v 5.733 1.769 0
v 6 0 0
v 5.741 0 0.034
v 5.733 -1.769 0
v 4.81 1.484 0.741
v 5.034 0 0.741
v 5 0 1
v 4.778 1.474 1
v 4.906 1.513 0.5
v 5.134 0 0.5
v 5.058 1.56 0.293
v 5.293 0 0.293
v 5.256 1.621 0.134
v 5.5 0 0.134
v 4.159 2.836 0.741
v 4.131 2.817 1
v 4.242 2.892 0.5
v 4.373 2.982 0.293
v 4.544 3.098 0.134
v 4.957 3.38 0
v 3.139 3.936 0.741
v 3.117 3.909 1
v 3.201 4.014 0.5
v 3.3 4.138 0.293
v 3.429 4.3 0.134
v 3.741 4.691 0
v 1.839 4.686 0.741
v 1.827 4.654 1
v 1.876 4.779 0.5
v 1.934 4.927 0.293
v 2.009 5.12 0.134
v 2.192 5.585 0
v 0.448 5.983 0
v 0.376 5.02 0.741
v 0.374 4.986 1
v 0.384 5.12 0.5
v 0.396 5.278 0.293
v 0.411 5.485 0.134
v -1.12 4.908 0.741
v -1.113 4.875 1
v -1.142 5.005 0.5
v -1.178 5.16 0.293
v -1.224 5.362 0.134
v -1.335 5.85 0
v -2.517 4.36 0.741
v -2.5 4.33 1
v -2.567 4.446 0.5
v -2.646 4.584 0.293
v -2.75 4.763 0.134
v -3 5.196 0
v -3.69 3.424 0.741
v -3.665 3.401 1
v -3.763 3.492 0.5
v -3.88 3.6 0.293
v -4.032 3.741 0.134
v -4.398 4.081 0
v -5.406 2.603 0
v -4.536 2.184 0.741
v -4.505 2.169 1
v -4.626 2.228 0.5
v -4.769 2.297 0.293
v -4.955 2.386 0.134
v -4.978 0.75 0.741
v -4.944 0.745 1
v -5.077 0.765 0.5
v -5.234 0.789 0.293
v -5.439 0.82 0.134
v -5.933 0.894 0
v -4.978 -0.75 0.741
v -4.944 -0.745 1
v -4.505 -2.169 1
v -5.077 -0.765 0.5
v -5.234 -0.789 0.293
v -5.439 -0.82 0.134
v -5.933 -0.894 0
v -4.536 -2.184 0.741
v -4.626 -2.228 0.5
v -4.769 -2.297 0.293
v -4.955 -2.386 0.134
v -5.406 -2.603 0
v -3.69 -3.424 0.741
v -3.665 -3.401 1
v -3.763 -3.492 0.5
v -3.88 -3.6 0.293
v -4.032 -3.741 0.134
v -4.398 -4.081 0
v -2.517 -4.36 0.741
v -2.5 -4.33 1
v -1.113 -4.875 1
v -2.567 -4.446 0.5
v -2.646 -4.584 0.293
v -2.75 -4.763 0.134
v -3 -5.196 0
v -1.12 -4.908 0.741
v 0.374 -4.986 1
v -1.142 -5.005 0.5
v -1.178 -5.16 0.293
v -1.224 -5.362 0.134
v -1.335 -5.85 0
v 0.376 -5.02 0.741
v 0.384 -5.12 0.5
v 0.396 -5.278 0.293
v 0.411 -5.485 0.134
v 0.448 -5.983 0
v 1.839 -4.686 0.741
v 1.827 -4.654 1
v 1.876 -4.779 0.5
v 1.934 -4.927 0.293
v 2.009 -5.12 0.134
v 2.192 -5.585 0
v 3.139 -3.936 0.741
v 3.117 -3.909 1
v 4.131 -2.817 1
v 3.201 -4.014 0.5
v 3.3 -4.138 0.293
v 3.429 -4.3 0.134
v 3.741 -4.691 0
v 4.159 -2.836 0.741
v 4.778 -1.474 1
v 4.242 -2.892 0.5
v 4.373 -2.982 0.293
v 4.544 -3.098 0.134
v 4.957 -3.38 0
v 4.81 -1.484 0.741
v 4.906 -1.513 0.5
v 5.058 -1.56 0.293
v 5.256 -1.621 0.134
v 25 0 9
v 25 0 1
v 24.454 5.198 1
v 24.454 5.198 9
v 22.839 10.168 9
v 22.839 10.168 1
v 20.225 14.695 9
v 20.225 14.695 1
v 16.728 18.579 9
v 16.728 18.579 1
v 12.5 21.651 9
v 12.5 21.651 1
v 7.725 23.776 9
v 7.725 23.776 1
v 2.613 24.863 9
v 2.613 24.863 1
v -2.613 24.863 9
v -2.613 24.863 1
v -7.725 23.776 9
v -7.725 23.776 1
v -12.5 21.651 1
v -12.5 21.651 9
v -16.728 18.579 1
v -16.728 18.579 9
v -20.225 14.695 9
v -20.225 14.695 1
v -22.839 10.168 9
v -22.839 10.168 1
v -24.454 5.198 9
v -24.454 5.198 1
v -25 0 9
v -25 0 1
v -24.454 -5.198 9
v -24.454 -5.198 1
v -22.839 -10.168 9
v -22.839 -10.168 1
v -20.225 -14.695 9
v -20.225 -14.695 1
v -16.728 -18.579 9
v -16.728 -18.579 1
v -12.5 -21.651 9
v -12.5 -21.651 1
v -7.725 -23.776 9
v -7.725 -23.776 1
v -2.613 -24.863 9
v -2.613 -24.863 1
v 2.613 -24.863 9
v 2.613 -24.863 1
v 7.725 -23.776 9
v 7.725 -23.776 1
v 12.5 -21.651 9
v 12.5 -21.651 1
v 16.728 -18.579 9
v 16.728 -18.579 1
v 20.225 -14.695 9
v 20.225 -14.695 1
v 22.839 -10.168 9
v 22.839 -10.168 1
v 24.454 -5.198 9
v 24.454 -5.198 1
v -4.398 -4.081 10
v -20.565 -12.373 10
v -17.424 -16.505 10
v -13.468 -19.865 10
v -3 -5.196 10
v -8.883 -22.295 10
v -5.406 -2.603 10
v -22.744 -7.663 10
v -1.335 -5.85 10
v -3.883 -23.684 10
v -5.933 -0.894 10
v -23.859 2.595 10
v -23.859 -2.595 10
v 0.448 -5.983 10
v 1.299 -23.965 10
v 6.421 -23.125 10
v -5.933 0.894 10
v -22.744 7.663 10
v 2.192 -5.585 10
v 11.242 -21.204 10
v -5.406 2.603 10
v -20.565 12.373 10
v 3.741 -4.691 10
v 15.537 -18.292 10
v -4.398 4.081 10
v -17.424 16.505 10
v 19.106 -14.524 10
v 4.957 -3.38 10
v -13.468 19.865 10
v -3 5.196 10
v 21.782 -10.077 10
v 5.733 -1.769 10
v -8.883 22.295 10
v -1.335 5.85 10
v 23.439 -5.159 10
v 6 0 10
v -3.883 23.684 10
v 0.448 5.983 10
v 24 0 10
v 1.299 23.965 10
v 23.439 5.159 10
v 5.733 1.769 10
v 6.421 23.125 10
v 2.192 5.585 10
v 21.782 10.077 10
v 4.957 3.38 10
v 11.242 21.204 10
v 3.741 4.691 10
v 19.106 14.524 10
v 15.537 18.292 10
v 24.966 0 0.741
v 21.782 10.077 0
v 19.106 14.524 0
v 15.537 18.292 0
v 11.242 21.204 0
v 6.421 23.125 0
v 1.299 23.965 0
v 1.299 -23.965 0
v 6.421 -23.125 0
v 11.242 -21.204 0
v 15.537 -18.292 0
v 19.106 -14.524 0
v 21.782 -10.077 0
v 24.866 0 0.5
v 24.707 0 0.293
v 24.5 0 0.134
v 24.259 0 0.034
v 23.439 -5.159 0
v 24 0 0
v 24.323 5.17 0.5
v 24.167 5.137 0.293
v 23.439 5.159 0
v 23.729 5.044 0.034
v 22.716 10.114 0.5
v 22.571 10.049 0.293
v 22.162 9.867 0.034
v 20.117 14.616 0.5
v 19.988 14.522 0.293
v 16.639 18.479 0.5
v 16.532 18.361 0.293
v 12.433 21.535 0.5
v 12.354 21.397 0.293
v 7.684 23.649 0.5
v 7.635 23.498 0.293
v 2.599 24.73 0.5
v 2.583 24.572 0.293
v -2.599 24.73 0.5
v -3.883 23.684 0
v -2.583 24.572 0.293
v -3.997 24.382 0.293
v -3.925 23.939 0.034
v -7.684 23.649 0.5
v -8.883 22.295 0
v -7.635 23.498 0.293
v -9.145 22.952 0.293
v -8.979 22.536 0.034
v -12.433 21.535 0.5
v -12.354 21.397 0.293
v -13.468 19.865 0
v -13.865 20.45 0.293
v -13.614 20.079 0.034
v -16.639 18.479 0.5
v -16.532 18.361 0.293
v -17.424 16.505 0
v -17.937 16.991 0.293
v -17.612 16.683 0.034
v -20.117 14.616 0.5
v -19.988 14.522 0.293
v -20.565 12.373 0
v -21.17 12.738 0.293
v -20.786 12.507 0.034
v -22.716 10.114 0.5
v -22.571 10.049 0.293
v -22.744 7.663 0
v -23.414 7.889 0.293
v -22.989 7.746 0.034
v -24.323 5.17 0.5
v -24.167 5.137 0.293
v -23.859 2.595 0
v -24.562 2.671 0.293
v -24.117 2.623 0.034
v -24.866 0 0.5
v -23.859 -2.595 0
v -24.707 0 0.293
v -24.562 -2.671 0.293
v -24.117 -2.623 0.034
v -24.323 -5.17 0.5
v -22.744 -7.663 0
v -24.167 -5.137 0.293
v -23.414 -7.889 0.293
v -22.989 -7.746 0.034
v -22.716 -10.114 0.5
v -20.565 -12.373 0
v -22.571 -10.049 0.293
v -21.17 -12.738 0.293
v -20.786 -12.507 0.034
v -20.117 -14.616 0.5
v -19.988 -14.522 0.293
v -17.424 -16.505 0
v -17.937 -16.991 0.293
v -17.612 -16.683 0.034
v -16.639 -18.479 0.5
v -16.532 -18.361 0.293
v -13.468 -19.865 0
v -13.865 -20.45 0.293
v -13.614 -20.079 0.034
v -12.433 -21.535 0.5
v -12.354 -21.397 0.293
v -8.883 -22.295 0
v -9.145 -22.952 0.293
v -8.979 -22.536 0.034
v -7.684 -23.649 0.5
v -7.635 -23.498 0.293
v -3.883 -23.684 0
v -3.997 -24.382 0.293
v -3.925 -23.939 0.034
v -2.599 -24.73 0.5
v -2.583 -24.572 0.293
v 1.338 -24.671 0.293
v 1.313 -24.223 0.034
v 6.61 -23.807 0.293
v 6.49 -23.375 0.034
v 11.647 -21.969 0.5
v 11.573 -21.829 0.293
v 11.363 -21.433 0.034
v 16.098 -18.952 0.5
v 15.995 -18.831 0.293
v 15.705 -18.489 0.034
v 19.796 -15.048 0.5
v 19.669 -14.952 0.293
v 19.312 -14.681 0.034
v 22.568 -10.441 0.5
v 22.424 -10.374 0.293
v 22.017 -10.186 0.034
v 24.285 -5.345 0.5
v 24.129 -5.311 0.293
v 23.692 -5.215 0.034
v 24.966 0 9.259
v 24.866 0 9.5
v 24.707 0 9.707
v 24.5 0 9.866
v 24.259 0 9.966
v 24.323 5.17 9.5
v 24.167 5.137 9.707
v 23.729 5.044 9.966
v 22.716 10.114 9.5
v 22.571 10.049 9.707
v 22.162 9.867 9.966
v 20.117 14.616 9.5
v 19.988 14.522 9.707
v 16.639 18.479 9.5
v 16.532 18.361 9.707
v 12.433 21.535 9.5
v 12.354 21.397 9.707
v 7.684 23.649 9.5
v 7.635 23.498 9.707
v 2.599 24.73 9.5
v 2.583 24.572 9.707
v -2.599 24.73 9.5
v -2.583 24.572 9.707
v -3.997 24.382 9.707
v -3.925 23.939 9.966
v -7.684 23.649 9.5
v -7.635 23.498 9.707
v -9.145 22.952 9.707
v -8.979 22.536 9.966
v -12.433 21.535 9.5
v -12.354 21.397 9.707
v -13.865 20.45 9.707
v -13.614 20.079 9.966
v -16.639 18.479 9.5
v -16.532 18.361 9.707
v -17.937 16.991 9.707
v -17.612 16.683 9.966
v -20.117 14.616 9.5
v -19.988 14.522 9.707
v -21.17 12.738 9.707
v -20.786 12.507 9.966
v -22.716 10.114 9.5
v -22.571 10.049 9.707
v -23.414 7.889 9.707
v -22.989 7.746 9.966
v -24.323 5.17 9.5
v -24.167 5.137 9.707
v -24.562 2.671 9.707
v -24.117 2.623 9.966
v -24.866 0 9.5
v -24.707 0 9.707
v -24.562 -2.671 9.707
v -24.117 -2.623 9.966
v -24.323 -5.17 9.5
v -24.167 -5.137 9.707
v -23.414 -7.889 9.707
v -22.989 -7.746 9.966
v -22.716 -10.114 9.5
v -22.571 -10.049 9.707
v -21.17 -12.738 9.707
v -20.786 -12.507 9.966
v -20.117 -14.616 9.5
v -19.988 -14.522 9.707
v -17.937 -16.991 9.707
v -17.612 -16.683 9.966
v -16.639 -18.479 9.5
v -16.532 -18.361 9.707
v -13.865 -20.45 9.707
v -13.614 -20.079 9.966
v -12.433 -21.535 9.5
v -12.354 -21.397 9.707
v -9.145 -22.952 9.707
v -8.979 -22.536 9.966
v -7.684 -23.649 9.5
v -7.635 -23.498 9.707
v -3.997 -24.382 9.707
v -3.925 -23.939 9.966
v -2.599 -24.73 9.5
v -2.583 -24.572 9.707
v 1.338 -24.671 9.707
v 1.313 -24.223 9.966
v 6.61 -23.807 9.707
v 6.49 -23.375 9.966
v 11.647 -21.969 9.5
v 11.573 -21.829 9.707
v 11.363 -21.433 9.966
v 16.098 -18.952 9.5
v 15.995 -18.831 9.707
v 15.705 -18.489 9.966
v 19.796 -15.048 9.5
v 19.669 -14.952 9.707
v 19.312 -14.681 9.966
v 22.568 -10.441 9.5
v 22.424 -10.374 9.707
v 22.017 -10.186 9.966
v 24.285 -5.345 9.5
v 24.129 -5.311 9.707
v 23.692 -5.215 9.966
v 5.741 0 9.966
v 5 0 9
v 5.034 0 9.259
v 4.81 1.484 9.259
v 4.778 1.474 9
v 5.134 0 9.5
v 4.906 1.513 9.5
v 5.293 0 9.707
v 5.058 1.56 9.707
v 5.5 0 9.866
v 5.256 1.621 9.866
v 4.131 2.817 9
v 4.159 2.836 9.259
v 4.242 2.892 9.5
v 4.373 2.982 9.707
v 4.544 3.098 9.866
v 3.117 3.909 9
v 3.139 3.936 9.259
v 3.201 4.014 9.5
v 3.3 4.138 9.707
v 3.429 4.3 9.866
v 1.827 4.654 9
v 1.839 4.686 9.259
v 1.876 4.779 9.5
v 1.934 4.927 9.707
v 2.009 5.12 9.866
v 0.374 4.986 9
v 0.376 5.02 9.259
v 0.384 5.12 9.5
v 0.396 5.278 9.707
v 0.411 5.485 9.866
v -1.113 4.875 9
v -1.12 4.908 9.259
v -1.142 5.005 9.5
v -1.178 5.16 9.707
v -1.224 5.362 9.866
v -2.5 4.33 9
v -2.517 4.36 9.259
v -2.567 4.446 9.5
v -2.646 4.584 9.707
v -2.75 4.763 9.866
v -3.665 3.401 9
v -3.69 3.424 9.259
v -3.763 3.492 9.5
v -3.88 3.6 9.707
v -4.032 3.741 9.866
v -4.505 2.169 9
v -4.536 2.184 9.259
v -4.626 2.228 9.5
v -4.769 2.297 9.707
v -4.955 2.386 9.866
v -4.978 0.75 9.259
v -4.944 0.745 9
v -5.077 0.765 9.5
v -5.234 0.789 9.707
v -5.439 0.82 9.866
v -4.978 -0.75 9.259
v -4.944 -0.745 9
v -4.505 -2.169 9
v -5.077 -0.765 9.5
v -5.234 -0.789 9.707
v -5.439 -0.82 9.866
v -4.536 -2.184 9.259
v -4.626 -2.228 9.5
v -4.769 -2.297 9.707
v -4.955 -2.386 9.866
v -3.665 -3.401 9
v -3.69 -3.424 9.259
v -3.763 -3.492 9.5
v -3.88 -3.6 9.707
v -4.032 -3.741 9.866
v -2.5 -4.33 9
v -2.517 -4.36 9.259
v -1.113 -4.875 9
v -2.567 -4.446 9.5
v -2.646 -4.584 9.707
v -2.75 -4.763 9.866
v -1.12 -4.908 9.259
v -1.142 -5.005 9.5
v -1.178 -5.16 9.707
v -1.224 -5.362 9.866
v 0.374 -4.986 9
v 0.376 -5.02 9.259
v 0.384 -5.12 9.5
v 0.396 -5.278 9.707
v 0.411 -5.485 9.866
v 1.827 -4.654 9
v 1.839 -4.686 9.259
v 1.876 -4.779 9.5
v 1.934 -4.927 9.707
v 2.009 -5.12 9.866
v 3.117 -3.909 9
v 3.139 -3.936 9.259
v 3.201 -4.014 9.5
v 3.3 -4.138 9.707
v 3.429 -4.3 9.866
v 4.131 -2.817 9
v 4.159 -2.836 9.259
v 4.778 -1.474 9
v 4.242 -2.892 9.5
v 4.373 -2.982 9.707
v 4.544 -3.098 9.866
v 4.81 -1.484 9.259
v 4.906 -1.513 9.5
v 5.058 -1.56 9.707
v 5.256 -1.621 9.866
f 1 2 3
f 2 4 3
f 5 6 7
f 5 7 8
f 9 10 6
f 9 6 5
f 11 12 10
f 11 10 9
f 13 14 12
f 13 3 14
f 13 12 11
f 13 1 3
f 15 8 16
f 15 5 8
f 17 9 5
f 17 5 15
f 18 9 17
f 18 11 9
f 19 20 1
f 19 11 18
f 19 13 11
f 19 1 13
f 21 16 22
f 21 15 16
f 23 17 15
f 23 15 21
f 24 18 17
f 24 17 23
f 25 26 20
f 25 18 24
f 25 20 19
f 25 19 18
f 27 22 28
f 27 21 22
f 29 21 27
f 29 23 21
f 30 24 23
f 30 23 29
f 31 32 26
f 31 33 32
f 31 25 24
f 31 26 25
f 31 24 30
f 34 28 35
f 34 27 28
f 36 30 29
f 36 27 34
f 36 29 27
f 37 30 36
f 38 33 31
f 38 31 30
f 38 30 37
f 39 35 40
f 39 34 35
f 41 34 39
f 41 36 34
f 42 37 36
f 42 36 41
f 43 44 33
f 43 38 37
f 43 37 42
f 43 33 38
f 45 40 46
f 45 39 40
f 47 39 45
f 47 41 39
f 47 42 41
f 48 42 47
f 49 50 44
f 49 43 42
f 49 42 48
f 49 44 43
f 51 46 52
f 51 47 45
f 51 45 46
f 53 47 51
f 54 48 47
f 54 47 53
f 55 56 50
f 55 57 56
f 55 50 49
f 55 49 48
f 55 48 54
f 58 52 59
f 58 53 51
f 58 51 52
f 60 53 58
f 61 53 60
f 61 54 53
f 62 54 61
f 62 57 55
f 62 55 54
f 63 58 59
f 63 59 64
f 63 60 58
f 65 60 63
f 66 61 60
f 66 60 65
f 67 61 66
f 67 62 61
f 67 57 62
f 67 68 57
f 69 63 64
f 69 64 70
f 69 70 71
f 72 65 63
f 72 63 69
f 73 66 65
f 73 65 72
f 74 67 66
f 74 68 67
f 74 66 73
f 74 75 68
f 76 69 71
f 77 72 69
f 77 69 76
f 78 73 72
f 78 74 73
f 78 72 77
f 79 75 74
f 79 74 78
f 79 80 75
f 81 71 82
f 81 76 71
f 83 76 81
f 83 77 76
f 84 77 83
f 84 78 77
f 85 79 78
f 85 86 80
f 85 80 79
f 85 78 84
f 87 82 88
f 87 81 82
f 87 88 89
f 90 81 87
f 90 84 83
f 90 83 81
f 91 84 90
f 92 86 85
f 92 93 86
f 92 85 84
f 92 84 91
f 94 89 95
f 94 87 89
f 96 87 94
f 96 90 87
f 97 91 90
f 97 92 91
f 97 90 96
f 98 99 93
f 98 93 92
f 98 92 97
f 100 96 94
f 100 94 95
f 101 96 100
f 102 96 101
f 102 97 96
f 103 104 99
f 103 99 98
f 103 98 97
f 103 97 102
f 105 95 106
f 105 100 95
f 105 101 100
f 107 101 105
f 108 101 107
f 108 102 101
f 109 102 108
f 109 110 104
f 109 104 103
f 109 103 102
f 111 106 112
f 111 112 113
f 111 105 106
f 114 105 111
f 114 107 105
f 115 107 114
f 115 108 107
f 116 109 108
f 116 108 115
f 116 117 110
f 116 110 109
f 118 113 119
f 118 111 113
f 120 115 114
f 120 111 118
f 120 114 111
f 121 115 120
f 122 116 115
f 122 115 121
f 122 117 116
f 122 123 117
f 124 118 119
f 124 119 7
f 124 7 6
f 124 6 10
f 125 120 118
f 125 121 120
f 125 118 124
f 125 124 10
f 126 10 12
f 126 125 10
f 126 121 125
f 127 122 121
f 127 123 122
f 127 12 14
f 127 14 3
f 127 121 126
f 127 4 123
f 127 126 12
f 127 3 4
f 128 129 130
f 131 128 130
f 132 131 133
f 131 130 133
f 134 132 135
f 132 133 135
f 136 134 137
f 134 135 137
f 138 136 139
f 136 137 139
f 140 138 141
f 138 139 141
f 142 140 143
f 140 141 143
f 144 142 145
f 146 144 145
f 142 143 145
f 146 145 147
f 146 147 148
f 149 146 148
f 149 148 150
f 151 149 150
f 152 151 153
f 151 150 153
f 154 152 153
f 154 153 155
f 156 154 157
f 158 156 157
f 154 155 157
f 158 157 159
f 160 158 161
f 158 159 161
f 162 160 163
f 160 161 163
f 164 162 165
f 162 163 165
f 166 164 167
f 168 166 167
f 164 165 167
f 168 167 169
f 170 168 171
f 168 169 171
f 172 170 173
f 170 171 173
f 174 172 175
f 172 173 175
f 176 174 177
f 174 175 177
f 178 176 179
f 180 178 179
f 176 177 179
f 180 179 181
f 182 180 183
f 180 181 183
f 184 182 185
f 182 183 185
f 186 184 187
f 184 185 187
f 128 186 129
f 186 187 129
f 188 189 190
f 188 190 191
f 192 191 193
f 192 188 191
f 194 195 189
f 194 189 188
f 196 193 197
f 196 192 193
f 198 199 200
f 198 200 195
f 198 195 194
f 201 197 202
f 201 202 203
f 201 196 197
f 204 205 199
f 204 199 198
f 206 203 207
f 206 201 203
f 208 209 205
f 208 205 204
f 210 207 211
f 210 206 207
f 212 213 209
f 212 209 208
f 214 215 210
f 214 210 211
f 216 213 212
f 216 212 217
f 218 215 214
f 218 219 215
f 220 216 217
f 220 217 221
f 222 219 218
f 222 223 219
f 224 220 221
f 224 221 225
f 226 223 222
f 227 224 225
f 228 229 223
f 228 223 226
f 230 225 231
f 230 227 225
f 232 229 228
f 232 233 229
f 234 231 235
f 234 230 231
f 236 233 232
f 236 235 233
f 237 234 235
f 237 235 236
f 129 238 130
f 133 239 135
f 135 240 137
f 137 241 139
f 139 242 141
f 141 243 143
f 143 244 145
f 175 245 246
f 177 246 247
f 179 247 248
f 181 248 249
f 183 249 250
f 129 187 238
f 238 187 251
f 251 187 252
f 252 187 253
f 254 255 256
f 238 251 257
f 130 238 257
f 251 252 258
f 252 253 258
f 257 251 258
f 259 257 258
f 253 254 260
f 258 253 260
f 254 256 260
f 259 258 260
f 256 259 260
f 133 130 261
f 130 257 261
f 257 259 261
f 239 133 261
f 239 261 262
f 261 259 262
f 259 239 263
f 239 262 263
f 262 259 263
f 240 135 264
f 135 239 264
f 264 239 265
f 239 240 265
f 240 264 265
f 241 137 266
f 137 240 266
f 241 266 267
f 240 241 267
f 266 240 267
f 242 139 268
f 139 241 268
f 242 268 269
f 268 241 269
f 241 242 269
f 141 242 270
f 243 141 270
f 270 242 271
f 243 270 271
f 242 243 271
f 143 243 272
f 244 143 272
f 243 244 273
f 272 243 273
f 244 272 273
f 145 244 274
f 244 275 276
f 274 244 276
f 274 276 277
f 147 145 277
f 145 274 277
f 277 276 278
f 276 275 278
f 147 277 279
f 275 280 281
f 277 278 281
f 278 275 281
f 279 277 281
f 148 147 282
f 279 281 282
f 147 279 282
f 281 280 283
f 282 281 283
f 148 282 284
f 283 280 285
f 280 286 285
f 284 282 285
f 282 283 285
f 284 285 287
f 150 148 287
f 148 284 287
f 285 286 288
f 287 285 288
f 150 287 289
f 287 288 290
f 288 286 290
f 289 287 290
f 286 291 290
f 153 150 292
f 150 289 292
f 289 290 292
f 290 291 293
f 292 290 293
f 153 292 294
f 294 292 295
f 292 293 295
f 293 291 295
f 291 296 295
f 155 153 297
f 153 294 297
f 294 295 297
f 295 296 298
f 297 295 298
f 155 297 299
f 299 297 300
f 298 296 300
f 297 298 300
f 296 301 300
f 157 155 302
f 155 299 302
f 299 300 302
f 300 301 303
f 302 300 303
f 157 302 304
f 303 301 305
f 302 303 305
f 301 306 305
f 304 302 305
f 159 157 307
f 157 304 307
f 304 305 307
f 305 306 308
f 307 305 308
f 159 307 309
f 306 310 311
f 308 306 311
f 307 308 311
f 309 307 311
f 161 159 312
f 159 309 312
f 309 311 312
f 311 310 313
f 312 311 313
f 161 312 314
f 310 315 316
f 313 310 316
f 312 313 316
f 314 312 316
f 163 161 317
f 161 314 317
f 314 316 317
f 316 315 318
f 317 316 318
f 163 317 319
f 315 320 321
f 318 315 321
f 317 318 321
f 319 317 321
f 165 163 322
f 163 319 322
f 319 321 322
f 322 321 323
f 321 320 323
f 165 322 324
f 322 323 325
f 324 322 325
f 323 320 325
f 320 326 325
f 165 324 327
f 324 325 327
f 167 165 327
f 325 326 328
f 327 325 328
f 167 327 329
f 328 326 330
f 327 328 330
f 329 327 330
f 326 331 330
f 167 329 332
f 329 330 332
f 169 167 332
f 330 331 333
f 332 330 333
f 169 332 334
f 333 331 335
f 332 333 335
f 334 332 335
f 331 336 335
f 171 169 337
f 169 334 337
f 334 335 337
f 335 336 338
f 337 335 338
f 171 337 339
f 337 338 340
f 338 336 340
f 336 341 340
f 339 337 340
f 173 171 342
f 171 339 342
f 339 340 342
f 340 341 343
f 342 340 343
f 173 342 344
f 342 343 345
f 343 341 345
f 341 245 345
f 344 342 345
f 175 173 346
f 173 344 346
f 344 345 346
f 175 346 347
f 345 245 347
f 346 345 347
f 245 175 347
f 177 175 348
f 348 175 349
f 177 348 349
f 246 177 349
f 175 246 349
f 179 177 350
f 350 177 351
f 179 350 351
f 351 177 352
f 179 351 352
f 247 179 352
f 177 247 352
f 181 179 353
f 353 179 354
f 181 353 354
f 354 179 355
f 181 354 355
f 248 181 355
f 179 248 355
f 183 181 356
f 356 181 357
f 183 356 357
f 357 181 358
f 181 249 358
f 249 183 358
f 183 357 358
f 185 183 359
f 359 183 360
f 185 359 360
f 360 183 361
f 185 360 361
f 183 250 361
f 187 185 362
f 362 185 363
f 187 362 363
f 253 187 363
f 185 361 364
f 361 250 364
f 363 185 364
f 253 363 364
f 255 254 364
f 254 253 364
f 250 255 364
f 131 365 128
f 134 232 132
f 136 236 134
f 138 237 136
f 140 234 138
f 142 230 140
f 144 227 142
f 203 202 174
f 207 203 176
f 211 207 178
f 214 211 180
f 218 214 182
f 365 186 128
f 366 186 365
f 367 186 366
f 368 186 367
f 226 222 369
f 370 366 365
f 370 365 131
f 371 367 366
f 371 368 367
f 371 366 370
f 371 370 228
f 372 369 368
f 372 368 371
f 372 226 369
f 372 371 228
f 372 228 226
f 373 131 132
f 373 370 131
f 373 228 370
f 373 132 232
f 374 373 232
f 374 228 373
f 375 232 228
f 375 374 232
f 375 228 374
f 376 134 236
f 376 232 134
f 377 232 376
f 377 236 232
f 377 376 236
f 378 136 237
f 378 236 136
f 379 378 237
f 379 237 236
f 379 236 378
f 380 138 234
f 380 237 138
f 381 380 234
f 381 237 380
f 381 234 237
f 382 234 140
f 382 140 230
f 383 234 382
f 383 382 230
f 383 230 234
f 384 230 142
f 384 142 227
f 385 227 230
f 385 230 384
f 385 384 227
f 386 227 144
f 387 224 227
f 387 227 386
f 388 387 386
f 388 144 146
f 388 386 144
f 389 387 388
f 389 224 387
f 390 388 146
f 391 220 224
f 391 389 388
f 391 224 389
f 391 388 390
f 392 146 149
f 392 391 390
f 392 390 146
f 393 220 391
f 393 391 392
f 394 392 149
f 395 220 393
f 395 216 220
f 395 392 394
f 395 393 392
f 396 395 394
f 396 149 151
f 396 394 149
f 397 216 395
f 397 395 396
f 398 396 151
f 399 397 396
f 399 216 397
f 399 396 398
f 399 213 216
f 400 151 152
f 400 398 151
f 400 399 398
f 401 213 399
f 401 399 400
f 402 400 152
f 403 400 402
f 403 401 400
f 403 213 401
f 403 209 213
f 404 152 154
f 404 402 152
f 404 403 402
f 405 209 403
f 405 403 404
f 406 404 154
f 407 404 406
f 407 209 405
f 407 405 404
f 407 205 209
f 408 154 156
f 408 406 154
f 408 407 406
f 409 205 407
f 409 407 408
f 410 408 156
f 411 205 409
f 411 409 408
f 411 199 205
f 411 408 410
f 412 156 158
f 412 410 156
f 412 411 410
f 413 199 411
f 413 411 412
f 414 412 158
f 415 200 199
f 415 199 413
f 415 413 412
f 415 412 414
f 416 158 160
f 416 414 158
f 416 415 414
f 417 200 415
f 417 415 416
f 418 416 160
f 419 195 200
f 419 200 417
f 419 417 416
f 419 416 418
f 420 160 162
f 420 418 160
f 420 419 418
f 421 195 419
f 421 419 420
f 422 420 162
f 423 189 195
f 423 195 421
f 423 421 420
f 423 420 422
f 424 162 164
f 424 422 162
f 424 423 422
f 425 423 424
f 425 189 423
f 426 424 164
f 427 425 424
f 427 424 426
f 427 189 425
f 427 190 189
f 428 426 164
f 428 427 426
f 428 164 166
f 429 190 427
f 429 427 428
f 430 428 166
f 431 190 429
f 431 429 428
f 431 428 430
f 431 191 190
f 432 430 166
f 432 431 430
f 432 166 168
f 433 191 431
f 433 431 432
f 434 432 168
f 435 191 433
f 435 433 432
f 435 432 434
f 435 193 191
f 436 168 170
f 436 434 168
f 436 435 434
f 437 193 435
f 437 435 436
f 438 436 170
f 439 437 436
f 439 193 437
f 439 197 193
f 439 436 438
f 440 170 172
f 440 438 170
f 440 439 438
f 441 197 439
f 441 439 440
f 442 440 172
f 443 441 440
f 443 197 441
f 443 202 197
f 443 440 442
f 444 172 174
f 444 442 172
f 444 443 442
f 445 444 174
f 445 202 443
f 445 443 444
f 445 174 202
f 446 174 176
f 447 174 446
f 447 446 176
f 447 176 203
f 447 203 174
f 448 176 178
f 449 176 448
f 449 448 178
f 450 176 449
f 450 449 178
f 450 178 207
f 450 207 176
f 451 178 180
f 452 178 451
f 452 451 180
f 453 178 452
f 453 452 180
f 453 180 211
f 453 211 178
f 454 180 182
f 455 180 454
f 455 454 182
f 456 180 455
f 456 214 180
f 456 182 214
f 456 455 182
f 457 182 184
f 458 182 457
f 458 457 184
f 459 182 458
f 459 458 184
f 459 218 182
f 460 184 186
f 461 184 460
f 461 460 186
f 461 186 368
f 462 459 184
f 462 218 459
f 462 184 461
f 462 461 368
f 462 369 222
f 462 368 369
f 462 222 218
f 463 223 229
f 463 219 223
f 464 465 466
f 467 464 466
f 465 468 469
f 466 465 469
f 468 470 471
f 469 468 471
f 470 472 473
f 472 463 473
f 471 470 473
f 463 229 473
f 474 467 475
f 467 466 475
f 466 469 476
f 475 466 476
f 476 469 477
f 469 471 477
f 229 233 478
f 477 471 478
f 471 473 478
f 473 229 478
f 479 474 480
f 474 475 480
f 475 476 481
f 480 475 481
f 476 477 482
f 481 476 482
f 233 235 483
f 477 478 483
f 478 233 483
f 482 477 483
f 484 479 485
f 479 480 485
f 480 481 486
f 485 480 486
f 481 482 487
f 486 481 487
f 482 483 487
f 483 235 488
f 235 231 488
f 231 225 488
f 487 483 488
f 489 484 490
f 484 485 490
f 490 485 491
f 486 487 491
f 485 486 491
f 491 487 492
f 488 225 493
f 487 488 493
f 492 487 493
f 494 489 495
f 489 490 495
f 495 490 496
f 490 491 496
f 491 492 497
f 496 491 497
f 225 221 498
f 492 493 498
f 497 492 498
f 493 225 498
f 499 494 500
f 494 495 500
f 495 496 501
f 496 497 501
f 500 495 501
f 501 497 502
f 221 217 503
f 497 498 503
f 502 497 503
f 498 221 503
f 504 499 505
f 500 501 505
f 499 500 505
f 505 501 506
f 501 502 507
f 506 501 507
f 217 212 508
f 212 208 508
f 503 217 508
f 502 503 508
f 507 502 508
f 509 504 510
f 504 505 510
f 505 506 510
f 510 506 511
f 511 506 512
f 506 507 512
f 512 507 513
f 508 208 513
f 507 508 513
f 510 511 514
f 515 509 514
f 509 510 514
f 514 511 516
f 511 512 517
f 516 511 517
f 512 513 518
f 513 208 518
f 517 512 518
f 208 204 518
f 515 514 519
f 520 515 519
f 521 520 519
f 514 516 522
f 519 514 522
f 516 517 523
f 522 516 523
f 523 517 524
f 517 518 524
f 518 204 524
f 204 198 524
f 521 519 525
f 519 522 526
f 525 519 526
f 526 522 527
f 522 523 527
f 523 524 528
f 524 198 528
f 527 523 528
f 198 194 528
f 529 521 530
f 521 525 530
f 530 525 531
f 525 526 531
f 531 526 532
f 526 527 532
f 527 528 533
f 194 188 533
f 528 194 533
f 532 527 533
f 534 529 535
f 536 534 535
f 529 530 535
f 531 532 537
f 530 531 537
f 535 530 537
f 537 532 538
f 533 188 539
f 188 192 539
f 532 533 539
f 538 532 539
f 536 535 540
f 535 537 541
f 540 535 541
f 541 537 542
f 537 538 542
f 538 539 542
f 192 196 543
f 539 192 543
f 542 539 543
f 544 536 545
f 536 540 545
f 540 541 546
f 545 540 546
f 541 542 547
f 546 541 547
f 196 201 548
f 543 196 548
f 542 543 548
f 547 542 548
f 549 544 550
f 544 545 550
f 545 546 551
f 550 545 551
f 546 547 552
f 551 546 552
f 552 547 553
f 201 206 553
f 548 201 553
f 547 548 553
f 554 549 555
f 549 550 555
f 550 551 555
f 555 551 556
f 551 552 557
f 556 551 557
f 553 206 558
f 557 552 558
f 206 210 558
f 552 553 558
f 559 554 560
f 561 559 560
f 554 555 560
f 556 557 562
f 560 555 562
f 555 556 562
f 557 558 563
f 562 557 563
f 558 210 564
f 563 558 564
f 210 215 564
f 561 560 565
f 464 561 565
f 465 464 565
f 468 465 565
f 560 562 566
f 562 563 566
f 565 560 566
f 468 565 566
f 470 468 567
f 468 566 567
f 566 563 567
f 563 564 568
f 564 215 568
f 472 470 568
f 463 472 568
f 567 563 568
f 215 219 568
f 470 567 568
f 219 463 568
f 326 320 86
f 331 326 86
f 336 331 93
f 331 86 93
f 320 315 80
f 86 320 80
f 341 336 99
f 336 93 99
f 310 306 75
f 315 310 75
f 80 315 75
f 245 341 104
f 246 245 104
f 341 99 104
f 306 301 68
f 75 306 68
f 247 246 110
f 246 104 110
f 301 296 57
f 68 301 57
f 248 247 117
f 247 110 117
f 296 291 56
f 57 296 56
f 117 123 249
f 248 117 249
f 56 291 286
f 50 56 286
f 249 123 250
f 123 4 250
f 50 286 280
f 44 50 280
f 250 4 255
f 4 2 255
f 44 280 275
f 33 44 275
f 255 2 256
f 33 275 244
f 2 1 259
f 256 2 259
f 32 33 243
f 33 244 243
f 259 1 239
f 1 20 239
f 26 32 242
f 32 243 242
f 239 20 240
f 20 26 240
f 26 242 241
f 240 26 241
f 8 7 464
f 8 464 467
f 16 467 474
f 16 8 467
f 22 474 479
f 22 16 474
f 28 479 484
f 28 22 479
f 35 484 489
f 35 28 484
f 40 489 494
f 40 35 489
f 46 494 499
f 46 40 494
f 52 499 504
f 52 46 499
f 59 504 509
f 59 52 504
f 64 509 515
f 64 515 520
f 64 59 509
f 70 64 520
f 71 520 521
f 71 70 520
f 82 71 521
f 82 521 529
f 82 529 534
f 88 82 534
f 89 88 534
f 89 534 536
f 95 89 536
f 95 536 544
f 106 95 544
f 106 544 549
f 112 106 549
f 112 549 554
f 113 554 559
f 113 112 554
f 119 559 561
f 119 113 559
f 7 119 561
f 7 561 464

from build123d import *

# Parameters (mm, degrees)
SKETCH1_R           = 25
SKETCH1_R_2         = 5
BOSS_EXTRUDE1_DEPTH = 10
FILLET1_R           = 1
FILLET2_R           = 1


with BuildPart() as part:
    # Sketch1 → Boss-Extrude1 (new body)
    with BuildSketch(Plane.XY):
        Circle(SKETCH1_R)
        Circle(SKETCH1_R_2, mode=Mode.SUBTRACT)
    extrude(amount=BOSS_EXTRUDE1_DEPTH)

    # Fillet1
    fillet1_edges = [part.edges().sort_by_distance(p)[0] for p in [
        (-25, 0, 0),
        (-5, 0, 0),
        (-5, 0, 10),
    ]]
    fillet(fillet1_edges, radius=FILLET1_R)

    # Fillet2
    fillet2_edges = [part.edges().sort_by_distance(p)[0] for p in [
        (-25, 0, 10),
    ]]
    fillet(fillet2_edges, radius=FILLET2_R)


solid = part.part
